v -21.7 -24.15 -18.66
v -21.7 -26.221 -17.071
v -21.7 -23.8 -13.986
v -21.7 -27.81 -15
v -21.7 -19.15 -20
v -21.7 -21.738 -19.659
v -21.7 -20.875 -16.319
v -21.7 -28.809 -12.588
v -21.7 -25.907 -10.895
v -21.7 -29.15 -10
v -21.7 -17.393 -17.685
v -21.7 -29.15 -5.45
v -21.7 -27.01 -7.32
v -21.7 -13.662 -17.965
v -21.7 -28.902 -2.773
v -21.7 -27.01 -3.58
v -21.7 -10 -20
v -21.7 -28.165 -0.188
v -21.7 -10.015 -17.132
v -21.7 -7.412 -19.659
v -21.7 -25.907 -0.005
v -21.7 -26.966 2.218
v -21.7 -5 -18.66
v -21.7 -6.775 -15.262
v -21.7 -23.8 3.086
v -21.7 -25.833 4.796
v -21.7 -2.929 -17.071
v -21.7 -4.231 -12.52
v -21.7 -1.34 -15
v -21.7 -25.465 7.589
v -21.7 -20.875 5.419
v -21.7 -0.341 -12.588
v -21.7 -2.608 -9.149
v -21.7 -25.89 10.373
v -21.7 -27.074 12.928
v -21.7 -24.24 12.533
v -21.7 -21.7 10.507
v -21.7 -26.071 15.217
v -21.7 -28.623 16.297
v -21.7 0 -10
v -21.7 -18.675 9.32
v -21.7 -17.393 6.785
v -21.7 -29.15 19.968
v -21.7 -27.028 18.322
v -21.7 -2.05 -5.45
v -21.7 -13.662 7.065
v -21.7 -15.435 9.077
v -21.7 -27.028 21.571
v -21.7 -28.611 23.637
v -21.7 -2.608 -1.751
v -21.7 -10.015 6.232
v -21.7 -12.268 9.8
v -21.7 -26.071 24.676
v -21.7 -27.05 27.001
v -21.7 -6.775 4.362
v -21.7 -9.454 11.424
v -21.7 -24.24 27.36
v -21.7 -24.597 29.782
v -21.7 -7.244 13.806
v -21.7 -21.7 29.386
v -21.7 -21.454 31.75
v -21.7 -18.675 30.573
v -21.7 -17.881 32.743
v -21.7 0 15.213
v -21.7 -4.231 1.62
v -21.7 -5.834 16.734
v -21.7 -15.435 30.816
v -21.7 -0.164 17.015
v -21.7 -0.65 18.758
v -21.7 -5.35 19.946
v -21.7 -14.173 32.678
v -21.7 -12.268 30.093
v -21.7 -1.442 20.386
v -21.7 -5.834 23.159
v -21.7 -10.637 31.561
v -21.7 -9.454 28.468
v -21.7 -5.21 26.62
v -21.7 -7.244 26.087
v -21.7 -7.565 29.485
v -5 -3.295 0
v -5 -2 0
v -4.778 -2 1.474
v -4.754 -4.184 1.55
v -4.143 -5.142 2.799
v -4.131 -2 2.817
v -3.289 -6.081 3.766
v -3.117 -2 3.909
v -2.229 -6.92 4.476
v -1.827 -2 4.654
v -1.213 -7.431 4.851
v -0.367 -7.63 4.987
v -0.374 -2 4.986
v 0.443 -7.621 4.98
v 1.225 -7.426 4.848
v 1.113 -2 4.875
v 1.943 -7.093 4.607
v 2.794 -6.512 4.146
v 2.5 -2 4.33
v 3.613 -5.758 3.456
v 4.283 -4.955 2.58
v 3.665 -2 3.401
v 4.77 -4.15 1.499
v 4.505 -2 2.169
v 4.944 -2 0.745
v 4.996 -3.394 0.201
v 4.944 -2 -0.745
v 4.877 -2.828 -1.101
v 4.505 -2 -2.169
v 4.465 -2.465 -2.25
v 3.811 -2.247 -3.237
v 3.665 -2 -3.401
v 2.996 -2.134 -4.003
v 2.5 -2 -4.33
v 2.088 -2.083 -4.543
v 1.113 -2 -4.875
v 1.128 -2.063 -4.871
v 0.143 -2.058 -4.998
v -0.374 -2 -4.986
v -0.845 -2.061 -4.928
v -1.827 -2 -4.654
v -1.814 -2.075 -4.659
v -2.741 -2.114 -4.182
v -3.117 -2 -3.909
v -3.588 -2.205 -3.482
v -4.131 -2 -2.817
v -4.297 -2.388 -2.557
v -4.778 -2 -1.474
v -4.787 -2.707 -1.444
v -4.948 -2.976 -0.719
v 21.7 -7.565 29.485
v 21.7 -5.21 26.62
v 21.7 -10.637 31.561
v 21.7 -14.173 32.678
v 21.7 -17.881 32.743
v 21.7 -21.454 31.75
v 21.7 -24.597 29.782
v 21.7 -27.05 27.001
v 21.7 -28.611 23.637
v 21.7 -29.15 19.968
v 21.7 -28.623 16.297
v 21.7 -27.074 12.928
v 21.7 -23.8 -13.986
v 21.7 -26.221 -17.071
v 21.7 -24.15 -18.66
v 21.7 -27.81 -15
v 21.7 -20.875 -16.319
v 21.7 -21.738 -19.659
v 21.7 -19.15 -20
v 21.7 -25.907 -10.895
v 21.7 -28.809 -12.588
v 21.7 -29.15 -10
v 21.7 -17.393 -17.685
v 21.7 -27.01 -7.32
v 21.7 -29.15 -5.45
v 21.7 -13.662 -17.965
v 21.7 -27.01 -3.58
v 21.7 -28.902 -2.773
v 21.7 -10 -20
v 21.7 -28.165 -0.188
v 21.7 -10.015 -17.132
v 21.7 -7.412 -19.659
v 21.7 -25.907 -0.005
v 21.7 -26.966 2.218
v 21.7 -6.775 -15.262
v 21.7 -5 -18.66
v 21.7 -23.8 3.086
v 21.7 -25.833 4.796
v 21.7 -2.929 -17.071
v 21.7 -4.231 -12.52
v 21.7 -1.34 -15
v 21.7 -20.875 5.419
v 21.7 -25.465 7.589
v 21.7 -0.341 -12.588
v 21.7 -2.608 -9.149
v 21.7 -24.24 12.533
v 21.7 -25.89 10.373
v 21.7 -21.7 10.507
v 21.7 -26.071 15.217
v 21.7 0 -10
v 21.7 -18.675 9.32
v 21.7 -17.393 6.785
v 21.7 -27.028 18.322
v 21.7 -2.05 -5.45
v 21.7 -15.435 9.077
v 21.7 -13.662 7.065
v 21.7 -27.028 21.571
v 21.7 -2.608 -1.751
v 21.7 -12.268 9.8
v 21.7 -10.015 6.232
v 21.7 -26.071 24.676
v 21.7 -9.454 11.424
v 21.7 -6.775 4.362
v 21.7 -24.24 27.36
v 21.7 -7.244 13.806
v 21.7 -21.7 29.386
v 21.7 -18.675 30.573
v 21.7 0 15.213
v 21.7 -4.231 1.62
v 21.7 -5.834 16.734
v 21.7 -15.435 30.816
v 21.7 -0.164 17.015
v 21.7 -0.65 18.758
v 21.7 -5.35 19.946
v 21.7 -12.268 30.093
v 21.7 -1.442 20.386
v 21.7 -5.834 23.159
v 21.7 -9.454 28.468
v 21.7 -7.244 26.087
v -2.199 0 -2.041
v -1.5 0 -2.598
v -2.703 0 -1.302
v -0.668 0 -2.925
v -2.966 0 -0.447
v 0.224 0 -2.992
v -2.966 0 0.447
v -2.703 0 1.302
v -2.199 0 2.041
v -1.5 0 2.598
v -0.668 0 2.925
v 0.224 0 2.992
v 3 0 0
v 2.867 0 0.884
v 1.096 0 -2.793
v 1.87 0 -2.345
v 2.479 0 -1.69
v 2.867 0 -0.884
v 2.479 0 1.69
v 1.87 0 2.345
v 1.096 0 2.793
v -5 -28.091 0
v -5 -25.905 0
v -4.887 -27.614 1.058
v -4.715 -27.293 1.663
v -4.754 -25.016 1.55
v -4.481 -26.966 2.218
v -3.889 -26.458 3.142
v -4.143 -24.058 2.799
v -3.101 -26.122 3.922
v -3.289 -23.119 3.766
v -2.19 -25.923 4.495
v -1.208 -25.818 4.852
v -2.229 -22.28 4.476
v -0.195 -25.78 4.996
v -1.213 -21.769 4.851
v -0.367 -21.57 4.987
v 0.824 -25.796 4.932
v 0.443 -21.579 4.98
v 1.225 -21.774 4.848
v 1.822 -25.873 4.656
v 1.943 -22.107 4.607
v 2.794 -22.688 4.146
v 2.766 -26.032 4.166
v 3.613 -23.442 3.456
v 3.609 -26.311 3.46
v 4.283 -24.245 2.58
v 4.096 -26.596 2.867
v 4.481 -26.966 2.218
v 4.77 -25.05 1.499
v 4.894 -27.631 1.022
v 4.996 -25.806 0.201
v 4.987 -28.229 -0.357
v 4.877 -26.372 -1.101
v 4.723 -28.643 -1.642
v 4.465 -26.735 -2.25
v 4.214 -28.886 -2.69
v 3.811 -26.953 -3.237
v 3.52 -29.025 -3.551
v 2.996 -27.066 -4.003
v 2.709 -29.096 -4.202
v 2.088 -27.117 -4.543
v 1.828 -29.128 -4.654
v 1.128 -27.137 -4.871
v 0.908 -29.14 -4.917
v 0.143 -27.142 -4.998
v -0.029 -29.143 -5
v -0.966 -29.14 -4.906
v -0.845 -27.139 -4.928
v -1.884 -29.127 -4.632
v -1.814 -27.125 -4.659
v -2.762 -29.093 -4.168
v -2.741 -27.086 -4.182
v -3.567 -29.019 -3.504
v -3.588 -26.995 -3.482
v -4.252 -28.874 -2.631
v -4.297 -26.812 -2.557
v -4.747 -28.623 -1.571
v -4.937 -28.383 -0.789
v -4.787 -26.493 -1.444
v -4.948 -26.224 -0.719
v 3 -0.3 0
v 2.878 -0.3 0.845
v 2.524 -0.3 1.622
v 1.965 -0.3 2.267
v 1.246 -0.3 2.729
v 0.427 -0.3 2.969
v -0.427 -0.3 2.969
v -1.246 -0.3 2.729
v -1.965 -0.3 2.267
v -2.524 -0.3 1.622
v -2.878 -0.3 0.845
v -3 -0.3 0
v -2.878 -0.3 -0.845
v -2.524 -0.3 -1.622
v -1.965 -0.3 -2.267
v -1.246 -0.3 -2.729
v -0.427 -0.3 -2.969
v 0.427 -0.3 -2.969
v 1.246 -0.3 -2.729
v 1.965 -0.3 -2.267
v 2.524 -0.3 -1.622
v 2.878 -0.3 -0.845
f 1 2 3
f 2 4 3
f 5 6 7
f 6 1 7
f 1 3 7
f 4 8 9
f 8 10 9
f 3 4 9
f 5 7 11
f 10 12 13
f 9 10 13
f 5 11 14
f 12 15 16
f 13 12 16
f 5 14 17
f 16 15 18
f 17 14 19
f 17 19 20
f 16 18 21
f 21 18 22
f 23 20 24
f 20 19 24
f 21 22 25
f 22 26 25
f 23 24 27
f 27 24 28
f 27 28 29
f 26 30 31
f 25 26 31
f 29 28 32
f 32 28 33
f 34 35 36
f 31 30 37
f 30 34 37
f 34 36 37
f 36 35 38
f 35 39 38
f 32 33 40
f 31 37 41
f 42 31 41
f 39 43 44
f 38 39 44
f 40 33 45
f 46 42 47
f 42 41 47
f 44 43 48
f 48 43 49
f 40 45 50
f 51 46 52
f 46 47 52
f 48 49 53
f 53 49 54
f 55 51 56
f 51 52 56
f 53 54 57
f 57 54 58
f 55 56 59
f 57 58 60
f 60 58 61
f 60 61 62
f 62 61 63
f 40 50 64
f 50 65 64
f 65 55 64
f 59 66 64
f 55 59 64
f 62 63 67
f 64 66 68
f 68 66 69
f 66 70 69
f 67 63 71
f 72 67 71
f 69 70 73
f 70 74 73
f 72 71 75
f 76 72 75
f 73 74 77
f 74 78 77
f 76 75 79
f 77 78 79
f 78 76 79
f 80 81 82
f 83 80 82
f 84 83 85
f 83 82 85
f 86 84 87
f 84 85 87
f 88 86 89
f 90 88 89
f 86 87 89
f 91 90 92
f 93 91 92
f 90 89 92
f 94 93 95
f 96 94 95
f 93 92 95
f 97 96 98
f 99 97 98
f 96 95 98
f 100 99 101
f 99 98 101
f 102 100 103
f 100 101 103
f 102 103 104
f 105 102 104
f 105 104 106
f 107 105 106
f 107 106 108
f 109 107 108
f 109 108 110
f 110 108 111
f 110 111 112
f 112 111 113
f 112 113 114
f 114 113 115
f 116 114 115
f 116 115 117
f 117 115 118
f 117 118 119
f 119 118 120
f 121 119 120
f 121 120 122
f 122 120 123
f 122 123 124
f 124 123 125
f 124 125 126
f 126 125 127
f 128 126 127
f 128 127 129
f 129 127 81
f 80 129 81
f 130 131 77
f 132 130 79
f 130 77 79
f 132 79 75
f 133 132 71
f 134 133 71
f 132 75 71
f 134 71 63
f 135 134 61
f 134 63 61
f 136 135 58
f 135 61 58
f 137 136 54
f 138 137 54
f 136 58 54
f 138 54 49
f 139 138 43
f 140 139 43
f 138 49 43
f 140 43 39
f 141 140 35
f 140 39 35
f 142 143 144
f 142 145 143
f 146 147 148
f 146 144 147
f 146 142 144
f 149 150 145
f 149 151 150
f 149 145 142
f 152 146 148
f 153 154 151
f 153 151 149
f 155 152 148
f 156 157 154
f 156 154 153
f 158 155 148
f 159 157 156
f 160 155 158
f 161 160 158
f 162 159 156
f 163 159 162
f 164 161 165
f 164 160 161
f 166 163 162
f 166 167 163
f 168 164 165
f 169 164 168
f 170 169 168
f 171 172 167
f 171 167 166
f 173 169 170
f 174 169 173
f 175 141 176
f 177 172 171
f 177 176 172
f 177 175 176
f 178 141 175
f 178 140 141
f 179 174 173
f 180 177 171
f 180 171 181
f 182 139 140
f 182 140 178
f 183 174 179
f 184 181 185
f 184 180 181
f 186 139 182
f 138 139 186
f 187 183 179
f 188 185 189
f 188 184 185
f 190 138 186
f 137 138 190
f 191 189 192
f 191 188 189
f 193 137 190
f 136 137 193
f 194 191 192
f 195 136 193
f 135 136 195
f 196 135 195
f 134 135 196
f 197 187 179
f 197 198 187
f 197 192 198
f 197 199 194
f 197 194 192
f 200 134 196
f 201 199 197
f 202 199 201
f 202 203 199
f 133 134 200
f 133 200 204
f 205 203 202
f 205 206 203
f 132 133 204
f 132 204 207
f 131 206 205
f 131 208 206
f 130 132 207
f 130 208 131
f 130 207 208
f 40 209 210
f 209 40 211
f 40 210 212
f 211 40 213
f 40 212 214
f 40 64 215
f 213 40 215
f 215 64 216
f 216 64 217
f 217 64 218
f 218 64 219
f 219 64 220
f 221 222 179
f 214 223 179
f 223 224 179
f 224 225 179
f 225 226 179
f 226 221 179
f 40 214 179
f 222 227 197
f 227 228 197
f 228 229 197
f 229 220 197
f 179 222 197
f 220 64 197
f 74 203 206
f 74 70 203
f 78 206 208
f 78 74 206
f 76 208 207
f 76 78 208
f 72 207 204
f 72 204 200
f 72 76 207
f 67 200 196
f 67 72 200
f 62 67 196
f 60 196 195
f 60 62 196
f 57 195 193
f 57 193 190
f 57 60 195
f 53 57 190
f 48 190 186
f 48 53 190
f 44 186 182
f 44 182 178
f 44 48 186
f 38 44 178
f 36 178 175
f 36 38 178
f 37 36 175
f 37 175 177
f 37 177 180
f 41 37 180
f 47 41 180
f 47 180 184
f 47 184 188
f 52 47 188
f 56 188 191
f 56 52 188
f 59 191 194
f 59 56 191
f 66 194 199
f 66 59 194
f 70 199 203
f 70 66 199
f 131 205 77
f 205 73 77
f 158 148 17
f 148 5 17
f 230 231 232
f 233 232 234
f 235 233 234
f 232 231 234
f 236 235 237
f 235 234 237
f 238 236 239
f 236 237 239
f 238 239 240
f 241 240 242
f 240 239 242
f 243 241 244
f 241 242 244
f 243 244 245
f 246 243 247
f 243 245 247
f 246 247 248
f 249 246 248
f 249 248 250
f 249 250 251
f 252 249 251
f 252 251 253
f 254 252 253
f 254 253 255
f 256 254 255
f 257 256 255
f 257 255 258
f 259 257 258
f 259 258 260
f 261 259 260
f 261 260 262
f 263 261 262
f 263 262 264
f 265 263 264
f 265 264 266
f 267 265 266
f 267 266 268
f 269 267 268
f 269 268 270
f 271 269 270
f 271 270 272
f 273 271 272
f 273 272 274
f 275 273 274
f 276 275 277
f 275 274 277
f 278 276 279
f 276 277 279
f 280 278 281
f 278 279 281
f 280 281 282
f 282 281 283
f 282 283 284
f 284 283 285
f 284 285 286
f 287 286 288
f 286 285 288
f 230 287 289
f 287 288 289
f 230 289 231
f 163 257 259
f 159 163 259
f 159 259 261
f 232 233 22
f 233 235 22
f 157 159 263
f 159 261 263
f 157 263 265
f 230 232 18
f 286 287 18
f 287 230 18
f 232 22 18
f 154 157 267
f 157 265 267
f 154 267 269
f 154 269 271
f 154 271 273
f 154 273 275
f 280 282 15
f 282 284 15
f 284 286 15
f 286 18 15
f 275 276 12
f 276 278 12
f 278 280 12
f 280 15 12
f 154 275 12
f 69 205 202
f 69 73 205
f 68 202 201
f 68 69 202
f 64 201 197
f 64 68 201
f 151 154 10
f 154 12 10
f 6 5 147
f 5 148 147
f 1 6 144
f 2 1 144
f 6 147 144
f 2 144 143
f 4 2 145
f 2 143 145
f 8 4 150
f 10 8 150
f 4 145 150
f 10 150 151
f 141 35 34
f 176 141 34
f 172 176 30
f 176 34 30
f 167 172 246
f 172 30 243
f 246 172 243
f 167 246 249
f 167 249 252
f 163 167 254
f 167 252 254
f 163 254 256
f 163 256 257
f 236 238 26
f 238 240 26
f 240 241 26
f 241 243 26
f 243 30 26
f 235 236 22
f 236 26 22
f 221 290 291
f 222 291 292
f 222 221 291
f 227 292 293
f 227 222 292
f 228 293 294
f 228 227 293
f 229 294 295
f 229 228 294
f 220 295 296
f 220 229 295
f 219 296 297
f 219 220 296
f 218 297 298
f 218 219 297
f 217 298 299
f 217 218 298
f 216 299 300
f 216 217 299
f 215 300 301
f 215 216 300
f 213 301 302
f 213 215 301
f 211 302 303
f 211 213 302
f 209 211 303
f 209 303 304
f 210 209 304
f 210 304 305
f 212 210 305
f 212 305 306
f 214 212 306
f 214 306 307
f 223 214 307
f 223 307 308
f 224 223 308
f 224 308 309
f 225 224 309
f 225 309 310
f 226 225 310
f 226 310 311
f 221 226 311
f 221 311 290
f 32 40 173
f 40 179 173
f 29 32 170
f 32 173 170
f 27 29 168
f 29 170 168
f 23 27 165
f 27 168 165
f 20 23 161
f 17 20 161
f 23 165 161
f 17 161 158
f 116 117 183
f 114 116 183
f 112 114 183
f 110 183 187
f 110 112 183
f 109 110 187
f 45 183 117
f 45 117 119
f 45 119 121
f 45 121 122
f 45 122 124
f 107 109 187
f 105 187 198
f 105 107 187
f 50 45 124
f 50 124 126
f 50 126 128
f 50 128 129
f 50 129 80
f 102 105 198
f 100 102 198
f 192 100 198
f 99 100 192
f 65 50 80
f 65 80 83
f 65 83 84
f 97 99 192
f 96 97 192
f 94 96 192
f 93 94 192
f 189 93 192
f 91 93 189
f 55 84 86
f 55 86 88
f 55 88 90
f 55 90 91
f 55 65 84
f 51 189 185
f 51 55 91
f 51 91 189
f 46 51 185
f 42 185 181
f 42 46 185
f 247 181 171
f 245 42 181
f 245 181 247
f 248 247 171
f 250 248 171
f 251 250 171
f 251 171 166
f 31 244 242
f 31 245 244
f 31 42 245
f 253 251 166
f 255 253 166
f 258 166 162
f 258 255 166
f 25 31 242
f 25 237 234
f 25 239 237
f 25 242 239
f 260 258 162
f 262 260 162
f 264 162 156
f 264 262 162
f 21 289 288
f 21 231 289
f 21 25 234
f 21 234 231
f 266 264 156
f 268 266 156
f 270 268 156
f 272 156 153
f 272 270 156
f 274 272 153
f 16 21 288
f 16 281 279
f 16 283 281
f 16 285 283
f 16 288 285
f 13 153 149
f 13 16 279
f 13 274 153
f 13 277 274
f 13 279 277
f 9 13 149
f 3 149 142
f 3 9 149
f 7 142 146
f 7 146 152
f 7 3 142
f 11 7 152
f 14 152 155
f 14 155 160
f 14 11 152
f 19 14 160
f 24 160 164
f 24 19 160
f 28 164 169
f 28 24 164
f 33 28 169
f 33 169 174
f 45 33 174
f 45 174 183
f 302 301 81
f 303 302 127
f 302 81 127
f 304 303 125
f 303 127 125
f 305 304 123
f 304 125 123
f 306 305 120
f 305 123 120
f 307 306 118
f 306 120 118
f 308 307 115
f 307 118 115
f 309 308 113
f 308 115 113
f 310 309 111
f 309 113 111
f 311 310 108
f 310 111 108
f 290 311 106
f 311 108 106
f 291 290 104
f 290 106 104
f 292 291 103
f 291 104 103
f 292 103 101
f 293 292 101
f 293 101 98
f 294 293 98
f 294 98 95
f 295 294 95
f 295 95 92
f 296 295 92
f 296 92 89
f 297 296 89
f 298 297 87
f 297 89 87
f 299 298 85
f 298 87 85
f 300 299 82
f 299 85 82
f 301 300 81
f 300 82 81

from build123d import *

# Parameters (mm, degrees)
F0_W          = 43.4
F0_H          = 38
F0_R          = 3
F1_DEPTH      = 2
F2_R          = 12.55
F2_R_2        = 10.9
F3_DEPTH      = 21.7
F3_DEPTH_BACK = 21.7
F4_R          = 5
F5_DEPTH      = 27.151
F8_R          = 10


# Not quite as in the source:
# - a feature names something its author has since deleted; it is built from what else it names


with BuildPart() as f1:
    # F0 (on Front) → F1 (new body)
    with BuildSketch(Plane.XZ):
        with Locations((0, -1)):
            Rectangle(F0_W, F0_H)
        Circle(F0_R, mode=Mode.SUBTRACT)
    extrude(amount=F1_DEPTH)

    # F2 (on Right) → F3 (join, two sides)
    with BuildSketch(Plane.YZ) as f3_sk:
        with BuildLine():
            ThreePointArc((-27.0737723252, 12.9281979258), (-25.4648034923, 7.5886797024), (-26.9655996144, 2.217753659))
            ThreePointArc((-26.9655996144, 2.217753659), (-28.5932479144, -1.4635839649), (-29.15, -5.45))
            Line((-29.15, -5.45), (-29.15, -20))
            Line((-29.15, -20), (-2, -20))
            Line((-2, -20), (-2, 18))
            Line((-2, 18), (0, 18))
            Line((0, 18), (-5.2100705327, 26.6195334989))
            ThreePointArc((-5.2100705327, 26.6195334989), (-23.0965208991, 30.8796696778), (-27.0737723252, 12.9281979258))
        make_face()
        with Locations((-14.6, -5.45)):
            Circle(F2_R, mode=Mode.SUBTRACT)
        with Locations((-16.25, 19.9464564457)):
            Circle(F2_R_2, mode=Mode.SUBTRACT)
    extrude(amount=-F3_DEPTH)
    extrude(f3_sk.sketch, amount=F3_DEPTH_BACK)

    # F4 (on face) → F5 (cut, through all)
    with BuildSketch(Plane(origin=(0, -2, 0), x_dir=(-1, 0, 0), z_dir=(0, 1, 0))):
        Circle(F4_R)
    extrude(amount=-F5_DEPTH, mode=Mode.SUBTRACT)

    # F6 (on Top) → F7 (revolve, cut)
    with BuildSketch(Plane.XY):
        Polygon((0, -2), (0, 0), (-3, 0), (-3, -0.3), (-5, -2), align=None)
    revolve(axis=Axis((0, -1, 0), (0, -1, 0)), mode=Mode.SUBTRACT)

    # F8
    f8_edges = [f1.edges().sort_by_distance(p)[0] for p in [
        (0, 0, -20),
        (0, 0, 18),
        (0, -29.15, -20),
    ]]
    fillet(f8_edges, radius=F8_R)


solid = f1.part
